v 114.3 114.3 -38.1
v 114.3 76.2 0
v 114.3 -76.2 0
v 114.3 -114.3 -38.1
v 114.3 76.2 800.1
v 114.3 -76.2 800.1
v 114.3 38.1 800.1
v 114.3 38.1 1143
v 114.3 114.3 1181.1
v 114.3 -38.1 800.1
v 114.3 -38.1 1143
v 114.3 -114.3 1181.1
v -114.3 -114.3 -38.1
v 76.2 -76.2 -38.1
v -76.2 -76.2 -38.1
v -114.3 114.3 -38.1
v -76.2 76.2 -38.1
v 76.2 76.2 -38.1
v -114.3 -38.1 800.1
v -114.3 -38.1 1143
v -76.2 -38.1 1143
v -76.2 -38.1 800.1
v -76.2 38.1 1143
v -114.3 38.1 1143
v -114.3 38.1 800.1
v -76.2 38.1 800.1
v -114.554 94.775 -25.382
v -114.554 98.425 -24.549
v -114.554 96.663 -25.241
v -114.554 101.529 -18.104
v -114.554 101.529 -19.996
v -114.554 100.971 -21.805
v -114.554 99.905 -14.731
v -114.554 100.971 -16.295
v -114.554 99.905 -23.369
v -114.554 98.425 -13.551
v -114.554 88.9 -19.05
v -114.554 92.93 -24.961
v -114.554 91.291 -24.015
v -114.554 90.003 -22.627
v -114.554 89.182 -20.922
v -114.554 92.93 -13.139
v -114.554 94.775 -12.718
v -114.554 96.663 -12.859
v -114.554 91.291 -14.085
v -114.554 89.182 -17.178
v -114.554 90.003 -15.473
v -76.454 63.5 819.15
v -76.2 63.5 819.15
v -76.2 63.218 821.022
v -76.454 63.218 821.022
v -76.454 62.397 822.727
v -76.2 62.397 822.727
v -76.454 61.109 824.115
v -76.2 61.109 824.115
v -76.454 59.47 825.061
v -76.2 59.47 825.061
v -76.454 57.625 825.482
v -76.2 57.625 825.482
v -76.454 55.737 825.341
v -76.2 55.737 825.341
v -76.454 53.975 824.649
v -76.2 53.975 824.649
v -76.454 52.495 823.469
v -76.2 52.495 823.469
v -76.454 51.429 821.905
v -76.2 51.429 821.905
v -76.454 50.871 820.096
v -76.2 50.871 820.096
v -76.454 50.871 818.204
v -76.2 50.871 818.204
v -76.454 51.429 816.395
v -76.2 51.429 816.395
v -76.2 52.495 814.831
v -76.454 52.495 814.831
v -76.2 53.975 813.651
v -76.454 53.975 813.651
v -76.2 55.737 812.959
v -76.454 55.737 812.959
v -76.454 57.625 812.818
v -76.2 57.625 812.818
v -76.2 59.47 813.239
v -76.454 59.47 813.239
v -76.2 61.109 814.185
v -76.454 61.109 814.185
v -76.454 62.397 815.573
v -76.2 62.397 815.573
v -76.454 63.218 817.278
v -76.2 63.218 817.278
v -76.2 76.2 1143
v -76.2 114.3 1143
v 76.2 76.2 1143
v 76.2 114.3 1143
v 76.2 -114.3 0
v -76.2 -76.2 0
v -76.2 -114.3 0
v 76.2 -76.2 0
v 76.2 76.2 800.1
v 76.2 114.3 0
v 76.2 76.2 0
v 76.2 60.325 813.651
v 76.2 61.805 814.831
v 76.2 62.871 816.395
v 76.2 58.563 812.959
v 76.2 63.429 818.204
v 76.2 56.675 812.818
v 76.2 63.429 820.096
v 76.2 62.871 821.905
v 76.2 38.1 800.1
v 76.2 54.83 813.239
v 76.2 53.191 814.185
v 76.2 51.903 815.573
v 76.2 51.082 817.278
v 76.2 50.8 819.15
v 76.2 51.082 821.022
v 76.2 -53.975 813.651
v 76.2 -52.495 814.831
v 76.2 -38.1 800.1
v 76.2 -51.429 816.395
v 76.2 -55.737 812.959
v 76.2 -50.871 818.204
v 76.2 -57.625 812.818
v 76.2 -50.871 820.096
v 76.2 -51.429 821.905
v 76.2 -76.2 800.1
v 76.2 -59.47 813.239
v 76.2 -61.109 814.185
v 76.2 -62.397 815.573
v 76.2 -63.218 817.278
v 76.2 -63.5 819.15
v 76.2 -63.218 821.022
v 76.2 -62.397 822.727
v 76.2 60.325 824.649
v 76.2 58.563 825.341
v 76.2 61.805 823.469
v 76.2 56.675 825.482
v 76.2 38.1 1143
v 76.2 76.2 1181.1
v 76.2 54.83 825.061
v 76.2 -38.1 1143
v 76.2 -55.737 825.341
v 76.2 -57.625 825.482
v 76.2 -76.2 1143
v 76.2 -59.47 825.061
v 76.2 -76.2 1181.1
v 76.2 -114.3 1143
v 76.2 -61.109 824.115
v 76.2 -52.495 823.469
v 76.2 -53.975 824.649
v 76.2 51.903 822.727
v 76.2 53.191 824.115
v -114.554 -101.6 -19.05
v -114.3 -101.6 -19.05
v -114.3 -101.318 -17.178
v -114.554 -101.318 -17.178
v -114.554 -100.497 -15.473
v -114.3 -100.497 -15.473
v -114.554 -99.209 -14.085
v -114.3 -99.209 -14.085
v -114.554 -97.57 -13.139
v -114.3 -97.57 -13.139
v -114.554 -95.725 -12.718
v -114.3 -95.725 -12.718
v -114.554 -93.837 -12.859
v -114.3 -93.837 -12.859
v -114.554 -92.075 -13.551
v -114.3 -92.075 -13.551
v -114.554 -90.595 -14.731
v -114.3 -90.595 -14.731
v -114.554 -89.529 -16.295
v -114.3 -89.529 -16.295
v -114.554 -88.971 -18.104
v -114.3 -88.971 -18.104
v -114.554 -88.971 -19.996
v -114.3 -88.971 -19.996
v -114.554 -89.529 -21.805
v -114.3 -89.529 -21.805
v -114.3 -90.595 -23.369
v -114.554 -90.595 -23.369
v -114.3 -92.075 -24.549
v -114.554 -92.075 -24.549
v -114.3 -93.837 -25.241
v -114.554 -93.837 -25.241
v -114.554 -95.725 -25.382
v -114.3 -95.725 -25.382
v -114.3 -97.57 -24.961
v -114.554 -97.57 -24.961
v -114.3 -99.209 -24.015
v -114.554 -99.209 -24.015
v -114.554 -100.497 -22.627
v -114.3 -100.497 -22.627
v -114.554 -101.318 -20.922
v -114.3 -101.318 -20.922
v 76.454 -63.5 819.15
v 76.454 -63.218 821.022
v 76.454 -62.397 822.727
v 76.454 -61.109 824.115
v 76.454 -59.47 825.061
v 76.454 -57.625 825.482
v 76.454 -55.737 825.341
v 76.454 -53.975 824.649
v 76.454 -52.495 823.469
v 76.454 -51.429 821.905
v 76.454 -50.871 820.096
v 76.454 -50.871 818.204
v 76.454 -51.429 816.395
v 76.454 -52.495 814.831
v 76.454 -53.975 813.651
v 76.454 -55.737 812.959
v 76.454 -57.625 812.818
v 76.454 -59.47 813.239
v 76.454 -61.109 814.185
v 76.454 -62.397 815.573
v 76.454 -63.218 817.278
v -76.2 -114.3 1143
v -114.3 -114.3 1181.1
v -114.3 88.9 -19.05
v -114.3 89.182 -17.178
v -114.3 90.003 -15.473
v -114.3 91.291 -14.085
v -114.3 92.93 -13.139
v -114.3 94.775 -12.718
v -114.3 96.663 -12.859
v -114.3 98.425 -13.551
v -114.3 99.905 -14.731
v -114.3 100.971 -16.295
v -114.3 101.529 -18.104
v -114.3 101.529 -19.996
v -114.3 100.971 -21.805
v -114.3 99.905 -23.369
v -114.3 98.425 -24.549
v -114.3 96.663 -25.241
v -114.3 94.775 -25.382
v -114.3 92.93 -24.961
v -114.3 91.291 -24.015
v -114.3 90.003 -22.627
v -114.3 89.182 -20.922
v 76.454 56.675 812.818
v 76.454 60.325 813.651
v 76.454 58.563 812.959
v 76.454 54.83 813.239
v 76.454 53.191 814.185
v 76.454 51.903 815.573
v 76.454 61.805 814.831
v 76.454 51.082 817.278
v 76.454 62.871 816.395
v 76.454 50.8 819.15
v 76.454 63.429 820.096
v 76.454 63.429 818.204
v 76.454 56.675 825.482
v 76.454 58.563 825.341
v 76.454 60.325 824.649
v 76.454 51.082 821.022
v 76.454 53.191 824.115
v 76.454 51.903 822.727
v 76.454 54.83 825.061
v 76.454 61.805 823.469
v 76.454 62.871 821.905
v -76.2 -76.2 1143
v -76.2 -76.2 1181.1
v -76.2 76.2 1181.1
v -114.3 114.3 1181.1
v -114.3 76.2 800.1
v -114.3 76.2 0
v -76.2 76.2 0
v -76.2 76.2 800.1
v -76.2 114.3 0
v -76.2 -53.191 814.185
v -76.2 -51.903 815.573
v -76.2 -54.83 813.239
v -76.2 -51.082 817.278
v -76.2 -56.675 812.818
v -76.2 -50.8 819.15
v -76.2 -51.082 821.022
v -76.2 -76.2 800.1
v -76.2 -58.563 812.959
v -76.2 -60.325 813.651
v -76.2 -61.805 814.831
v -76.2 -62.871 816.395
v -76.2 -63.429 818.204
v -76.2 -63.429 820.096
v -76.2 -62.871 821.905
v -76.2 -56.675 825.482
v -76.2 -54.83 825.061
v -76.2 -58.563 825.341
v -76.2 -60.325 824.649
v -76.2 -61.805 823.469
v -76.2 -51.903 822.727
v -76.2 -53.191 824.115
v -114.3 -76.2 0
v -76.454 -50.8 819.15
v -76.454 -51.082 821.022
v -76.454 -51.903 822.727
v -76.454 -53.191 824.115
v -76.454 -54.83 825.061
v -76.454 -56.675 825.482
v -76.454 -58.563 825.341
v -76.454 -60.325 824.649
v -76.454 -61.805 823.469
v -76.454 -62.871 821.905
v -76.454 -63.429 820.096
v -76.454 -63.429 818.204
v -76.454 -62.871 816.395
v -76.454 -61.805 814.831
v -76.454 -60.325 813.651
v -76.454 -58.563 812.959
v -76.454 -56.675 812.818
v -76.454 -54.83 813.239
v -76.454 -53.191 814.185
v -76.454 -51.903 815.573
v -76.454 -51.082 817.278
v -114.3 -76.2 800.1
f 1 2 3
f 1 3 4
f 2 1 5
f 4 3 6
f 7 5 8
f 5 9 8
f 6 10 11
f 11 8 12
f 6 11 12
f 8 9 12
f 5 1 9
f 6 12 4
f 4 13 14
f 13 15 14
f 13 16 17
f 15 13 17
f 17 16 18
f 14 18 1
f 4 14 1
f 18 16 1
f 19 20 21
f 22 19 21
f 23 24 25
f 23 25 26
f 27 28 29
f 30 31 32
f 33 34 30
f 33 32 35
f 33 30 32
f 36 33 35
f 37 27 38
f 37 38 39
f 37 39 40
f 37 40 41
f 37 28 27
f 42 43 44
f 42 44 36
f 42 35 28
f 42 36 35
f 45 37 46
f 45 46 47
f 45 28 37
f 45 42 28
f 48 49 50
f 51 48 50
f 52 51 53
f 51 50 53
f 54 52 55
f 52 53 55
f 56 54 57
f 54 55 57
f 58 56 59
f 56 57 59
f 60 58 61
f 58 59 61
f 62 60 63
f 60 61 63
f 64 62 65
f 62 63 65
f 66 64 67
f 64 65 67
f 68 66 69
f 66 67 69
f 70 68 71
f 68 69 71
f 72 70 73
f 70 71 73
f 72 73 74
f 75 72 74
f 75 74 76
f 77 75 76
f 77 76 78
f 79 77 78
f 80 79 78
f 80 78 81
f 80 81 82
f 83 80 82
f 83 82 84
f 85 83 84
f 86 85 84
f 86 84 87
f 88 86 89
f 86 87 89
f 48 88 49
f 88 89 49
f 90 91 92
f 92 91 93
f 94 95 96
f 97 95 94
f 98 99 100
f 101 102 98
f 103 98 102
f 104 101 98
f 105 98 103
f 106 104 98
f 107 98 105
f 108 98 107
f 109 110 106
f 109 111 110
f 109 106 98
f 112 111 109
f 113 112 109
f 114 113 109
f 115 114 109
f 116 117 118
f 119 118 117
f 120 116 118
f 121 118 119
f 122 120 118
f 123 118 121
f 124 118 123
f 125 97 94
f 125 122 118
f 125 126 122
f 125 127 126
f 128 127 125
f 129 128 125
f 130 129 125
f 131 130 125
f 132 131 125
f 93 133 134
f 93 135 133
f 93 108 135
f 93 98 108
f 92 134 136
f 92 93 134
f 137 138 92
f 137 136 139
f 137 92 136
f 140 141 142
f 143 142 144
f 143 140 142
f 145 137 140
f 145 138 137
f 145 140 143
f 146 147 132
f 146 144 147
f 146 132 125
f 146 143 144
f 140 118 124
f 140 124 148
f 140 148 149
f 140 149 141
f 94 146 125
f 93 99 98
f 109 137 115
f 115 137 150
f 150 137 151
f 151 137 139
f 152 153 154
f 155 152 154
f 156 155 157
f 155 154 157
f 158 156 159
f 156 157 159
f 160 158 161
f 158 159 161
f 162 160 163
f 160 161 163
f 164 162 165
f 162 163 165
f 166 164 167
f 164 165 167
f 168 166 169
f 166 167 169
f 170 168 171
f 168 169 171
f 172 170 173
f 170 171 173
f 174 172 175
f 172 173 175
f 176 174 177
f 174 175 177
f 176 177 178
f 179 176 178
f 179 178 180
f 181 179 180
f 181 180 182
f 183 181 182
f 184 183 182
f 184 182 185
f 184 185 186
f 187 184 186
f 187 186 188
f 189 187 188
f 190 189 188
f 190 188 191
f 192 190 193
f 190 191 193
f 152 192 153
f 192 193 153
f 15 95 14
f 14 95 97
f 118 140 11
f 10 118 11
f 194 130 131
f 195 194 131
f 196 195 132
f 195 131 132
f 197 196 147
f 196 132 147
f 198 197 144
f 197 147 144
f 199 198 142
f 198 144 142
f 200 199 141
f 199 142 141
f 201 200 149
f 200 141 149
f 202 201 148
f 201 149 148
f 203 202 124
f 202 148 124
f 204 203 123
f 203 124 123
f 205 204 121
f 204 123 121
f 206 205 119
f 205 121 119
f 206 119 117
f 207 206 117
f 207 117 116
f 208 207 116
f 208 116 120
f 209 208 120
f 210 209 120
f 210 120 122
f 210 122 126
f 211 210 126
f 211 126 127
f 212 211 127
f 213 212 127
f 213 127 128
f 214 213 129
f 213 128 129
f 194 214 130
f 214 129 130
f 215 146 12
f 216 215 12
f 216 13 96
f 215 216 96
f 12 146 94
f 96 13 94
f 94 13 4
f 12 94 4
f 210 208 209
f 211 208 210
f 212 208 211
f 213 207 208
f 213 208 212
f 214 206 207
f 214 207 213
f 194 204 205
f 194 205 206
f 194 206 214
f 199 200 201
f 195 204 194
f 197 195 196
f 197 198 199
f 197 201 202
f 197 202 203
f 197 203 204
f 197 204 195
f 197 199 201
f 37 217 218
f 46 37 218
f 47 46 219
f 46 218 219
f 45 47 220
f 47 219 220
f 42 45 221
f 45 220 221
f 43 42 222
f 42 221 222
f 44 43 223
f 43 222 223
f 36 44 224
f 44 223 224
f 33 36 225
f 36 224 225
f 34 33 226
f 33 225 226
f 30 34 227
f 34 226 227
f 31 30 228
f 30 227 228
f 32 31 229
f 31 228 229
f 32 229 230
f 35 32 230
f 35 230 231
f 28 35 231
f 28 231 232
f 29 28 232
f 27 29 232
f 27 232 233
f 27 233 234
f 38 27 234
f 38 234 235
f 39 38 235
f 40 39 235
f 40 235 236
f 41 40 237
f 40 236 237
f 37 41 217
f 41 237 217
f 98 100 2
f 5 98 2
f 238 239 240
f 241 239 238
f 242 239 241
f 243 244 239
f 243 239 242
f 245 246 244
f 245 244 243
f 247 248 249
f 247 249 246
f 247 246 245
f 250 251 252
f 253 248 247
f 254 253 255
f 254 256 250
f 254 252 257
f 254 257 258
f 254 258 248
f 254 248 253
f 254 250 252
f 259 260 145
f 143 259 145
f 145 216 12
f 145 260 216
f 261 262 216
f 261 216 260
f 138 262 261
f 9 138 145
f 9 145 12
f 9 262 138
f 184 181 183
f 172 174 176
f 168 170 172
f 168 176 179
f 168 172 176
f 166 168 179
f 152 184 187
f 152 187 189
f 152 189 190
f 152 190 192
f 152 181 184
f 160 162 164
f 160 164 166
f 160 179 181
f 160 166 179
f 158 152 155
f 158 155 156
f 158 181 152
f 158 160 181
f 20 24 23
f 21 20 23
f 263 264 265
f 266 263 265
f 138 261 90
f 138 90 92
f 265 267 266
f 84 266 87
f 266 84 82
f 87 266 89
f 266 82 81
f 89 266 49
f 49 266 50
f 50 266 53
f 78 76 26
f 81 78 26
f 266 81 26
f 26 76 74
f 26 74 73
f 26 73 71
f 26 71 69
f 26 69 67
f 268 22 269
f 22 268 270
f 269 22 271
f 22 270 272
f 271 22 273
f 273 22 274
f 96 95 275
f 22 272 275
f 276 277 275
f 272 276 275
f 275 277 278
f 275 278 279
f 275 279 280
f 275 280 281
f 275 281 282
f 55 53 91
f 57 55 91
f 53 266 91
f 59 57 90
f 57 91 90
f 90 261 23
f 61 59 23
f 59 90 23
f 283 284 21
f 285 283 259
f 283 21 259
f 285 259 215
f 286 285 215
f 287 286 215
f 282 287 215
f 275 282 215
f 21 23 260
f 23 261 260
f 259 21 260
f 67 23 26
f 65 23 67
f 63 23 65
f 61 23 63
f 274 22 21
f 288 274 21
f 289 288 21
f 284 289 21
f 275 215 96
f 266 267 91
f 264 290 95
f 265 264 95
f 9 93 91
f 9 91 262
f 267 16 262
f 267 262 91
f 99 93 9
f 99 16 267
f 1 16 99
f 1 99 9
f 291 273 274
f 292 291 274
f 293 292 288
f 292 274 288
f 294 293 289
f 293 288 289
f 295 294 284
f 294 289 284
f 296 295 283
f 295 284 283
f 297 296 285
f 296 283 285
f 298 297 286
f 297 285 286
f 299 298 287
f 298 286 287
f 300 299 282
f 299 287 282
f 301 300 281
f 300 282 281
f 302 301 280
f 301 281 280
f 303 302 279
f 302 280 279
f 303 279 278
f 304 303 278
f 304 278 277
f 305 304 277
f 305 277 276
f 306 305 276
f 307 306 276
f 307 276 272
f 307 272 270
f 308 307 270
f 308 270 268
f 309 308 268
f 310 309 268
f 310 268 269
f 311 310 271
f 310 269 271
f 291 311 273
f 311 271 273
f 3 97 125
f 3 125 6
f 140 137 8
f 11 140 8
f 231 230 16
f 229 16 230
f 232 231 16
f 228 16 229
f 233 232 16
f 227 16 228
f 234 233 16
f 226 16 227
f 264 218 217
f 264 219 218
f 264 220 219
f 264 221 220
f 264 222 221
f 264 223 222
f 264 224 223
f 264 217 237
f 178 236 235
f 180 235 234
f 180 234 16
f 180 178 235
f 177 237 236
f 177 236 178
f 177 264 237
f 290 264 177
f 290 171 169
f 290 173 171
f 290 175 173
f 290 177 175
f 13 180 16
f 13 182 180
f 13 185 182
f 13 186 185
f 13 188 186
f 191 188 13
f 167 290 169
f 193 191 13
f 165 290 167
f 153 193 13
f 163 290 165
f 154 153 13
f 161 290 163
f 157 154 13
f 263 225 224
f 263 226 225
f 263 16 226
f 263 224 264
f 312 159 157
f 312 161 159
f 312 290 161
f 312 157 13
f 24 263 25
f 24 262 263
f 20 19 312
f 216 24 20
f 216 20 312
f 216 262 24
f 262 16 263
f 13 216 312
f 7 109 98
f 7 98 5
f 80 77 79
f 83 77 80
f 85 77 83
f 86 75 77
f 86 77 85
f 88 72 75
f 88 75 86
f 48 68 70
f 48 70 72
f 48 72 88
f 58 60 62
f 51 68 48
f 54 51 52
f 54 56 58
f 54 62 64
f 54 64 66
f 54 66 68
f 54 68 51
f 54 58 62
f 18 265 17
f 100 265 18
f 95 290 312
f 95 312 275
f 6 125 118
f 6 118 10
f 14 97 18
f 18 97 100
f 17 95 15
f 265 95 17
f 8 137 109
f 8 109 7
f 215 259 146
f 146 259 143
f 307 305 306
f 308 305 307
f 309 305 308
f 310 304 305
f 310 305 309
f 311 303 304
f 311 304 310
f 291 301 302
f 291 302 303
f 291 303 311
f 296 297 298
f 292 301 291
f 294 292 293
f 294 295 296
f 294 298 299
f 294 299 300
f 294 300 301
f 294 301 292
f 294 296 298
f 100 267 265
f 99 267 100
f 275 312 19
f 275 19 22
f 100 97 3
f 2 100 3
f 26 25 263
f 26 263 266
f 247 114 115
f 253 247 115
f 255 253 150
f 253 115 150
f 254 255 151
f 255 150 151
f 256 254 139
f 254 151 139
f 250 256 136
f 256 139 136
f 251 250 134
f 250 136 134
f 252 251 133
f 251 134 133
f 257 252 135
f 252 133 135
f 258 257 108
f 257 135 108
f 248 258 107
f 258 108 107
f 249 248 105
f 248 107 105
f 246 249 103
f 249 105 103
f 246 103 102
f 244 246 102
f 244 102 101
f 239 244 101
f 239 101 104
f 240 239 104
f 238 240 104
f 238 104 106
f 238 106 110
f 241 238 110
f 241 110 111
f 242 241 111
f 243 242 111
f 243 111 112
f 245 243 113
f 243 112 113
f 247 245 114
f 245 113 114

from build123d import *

# Parameters (mm, degrees)
F0_W      = 228.6
F0_H      = 228.6
F1_DEPTH  = 38.1
F2_W      = 152.4
F2_H      = 152.4
F3_DEPTH  = 38.1
F4_W      = 38.1
F4_H      = 38.1
F5_DEPTH  = 1143
F6_W      = 228.6
F6_H      = 228.6
F7_DEPTH  = 38.1
F8_W      = 152.4
F8_H      = 152.4
F9_DEPTH  = 38.1
F10_W     = 38.1
F10_H     = 38.1
F11_DEPTH = 342.9
F12_W     = 38.1
F12_H     = 38.1
F13_DEPTH = 342.9
F14_R     = 6.35
F15_DEPTH = 0.254
F16_R     = 6.35
F17_DEPTH = 0.254
F18_R     = 6.35
F19_DEPTH = 0.254


with BuildPart() as f1:
    # F0 (on Top) → F1 (new body)
    with BuildSketch(Plane.XY):
        Rectangle(F0_W, F0_H)
    extrude(amount=-F1_DEPTH)

    # F2 (on face) → F3 (cut)
    with BuildSketch(Plane.XY):
        Rectangle(F2_W, F2_H)
    extrude(amount=-F3_DEPTH, mode=Mode.SUBTRACT)

    # F4 (on face) → F5 (join)
    with BuildSketch(Plane.XY):
        with Locations((-95.25, 95.25)):
            Rectangle(F4_W, F4_H)
        with Locations((95.25, 95.25)):
            Rectangle(F4_W, F4_H)
        with Locations((95.25, -95.25)):
            Rectangle(F4_W, F4_H)
        with Locations((-95.25, -95.25)):
            Rectangle(F4_W, F4_H)
    extrude(amount=F5_DEPTH)

    # F6 (on face) → F7 (join)
    with BuildSketch(Plane.XY.offset(1143)):
        Rectangle(F6_W, F6_H)
    extrude(amount=F7_DEPTH)

    # F8 (on face) → F9 (cut)
    with BuildSketch(Plane.XY.offset(1181.1)):
        Rectangle(F8_W, F8_H)
    extrude(amount=-F9_DEPTH, mode=Mode.SUBTRACT)

    # F10 (on face) → F11 (join)
    with BuildSketch(Plane(origin=(0, 0, 1143), x_dir=(1, 0, 0), z_dir=(0, 0, -1))):
        with Locations((95.25, 57.15)):
            Rectangle(F10_W, F10_H)
        with Locations((95.25, -57.15)):
            Rectangle(F10_W, F10_H)
    extrude(amount=F11_DEPTH)

    # F12 (on face) → F13 (join)
    with BuildSketch(Plane(origin=(0, 0, 1143), x_dir=(1, 0, 0), z_dir=(0, 0, -1))):
        with Locations((-95.25, -57.15)):
            Rectangle(F12_W, F12_H)
        with Locations((-95.25, 57.15)):
            Rectangle(F12_W, F12_H)
    extrude(amount=F13_DEPTH)

    # F14 (on face) → F15 (join)
    with BuildSketch(Plane(origin=(-114.3, 0, 0), x_dir=(0, -1, 0), z_dir=(-1, 0, 0))):
        with Locations((-95.25, -19.05)):
            Circle(F14_R)
        with Locations((95.25, -19.05)):
            Circle(F14_R)
    extrude(amount=F15_DEPTH)

    # F16 (on face) → F17 (cut)
    with BuildSketch(Plane.YZ.offset(-76.2)):
        with Locations((-57.15, 819.15)):
            Circle(F16_R)
        with Locations((57.15, 819.15)):
            Circle(F16_R)
    extrude(amount=-F17_DEPTH, mode=Mode.SUBTRACT)

    # F18 (on face) → F19 (cut)
    with BuildSketch(Plane(origin=(76.2, 0, 0), x_dir=(0, -1, 0), z_dir=(-1, 0, 0))):
        with Locations((-57.15, 819.15)):
            Circle(F18_R)
        with Locations((57.15, 819.15)):
            Circle(F18_R)
    extrude(amount=-F19_DEPTH, mode=Mode.SUBTRACT)


solid = f1.part
